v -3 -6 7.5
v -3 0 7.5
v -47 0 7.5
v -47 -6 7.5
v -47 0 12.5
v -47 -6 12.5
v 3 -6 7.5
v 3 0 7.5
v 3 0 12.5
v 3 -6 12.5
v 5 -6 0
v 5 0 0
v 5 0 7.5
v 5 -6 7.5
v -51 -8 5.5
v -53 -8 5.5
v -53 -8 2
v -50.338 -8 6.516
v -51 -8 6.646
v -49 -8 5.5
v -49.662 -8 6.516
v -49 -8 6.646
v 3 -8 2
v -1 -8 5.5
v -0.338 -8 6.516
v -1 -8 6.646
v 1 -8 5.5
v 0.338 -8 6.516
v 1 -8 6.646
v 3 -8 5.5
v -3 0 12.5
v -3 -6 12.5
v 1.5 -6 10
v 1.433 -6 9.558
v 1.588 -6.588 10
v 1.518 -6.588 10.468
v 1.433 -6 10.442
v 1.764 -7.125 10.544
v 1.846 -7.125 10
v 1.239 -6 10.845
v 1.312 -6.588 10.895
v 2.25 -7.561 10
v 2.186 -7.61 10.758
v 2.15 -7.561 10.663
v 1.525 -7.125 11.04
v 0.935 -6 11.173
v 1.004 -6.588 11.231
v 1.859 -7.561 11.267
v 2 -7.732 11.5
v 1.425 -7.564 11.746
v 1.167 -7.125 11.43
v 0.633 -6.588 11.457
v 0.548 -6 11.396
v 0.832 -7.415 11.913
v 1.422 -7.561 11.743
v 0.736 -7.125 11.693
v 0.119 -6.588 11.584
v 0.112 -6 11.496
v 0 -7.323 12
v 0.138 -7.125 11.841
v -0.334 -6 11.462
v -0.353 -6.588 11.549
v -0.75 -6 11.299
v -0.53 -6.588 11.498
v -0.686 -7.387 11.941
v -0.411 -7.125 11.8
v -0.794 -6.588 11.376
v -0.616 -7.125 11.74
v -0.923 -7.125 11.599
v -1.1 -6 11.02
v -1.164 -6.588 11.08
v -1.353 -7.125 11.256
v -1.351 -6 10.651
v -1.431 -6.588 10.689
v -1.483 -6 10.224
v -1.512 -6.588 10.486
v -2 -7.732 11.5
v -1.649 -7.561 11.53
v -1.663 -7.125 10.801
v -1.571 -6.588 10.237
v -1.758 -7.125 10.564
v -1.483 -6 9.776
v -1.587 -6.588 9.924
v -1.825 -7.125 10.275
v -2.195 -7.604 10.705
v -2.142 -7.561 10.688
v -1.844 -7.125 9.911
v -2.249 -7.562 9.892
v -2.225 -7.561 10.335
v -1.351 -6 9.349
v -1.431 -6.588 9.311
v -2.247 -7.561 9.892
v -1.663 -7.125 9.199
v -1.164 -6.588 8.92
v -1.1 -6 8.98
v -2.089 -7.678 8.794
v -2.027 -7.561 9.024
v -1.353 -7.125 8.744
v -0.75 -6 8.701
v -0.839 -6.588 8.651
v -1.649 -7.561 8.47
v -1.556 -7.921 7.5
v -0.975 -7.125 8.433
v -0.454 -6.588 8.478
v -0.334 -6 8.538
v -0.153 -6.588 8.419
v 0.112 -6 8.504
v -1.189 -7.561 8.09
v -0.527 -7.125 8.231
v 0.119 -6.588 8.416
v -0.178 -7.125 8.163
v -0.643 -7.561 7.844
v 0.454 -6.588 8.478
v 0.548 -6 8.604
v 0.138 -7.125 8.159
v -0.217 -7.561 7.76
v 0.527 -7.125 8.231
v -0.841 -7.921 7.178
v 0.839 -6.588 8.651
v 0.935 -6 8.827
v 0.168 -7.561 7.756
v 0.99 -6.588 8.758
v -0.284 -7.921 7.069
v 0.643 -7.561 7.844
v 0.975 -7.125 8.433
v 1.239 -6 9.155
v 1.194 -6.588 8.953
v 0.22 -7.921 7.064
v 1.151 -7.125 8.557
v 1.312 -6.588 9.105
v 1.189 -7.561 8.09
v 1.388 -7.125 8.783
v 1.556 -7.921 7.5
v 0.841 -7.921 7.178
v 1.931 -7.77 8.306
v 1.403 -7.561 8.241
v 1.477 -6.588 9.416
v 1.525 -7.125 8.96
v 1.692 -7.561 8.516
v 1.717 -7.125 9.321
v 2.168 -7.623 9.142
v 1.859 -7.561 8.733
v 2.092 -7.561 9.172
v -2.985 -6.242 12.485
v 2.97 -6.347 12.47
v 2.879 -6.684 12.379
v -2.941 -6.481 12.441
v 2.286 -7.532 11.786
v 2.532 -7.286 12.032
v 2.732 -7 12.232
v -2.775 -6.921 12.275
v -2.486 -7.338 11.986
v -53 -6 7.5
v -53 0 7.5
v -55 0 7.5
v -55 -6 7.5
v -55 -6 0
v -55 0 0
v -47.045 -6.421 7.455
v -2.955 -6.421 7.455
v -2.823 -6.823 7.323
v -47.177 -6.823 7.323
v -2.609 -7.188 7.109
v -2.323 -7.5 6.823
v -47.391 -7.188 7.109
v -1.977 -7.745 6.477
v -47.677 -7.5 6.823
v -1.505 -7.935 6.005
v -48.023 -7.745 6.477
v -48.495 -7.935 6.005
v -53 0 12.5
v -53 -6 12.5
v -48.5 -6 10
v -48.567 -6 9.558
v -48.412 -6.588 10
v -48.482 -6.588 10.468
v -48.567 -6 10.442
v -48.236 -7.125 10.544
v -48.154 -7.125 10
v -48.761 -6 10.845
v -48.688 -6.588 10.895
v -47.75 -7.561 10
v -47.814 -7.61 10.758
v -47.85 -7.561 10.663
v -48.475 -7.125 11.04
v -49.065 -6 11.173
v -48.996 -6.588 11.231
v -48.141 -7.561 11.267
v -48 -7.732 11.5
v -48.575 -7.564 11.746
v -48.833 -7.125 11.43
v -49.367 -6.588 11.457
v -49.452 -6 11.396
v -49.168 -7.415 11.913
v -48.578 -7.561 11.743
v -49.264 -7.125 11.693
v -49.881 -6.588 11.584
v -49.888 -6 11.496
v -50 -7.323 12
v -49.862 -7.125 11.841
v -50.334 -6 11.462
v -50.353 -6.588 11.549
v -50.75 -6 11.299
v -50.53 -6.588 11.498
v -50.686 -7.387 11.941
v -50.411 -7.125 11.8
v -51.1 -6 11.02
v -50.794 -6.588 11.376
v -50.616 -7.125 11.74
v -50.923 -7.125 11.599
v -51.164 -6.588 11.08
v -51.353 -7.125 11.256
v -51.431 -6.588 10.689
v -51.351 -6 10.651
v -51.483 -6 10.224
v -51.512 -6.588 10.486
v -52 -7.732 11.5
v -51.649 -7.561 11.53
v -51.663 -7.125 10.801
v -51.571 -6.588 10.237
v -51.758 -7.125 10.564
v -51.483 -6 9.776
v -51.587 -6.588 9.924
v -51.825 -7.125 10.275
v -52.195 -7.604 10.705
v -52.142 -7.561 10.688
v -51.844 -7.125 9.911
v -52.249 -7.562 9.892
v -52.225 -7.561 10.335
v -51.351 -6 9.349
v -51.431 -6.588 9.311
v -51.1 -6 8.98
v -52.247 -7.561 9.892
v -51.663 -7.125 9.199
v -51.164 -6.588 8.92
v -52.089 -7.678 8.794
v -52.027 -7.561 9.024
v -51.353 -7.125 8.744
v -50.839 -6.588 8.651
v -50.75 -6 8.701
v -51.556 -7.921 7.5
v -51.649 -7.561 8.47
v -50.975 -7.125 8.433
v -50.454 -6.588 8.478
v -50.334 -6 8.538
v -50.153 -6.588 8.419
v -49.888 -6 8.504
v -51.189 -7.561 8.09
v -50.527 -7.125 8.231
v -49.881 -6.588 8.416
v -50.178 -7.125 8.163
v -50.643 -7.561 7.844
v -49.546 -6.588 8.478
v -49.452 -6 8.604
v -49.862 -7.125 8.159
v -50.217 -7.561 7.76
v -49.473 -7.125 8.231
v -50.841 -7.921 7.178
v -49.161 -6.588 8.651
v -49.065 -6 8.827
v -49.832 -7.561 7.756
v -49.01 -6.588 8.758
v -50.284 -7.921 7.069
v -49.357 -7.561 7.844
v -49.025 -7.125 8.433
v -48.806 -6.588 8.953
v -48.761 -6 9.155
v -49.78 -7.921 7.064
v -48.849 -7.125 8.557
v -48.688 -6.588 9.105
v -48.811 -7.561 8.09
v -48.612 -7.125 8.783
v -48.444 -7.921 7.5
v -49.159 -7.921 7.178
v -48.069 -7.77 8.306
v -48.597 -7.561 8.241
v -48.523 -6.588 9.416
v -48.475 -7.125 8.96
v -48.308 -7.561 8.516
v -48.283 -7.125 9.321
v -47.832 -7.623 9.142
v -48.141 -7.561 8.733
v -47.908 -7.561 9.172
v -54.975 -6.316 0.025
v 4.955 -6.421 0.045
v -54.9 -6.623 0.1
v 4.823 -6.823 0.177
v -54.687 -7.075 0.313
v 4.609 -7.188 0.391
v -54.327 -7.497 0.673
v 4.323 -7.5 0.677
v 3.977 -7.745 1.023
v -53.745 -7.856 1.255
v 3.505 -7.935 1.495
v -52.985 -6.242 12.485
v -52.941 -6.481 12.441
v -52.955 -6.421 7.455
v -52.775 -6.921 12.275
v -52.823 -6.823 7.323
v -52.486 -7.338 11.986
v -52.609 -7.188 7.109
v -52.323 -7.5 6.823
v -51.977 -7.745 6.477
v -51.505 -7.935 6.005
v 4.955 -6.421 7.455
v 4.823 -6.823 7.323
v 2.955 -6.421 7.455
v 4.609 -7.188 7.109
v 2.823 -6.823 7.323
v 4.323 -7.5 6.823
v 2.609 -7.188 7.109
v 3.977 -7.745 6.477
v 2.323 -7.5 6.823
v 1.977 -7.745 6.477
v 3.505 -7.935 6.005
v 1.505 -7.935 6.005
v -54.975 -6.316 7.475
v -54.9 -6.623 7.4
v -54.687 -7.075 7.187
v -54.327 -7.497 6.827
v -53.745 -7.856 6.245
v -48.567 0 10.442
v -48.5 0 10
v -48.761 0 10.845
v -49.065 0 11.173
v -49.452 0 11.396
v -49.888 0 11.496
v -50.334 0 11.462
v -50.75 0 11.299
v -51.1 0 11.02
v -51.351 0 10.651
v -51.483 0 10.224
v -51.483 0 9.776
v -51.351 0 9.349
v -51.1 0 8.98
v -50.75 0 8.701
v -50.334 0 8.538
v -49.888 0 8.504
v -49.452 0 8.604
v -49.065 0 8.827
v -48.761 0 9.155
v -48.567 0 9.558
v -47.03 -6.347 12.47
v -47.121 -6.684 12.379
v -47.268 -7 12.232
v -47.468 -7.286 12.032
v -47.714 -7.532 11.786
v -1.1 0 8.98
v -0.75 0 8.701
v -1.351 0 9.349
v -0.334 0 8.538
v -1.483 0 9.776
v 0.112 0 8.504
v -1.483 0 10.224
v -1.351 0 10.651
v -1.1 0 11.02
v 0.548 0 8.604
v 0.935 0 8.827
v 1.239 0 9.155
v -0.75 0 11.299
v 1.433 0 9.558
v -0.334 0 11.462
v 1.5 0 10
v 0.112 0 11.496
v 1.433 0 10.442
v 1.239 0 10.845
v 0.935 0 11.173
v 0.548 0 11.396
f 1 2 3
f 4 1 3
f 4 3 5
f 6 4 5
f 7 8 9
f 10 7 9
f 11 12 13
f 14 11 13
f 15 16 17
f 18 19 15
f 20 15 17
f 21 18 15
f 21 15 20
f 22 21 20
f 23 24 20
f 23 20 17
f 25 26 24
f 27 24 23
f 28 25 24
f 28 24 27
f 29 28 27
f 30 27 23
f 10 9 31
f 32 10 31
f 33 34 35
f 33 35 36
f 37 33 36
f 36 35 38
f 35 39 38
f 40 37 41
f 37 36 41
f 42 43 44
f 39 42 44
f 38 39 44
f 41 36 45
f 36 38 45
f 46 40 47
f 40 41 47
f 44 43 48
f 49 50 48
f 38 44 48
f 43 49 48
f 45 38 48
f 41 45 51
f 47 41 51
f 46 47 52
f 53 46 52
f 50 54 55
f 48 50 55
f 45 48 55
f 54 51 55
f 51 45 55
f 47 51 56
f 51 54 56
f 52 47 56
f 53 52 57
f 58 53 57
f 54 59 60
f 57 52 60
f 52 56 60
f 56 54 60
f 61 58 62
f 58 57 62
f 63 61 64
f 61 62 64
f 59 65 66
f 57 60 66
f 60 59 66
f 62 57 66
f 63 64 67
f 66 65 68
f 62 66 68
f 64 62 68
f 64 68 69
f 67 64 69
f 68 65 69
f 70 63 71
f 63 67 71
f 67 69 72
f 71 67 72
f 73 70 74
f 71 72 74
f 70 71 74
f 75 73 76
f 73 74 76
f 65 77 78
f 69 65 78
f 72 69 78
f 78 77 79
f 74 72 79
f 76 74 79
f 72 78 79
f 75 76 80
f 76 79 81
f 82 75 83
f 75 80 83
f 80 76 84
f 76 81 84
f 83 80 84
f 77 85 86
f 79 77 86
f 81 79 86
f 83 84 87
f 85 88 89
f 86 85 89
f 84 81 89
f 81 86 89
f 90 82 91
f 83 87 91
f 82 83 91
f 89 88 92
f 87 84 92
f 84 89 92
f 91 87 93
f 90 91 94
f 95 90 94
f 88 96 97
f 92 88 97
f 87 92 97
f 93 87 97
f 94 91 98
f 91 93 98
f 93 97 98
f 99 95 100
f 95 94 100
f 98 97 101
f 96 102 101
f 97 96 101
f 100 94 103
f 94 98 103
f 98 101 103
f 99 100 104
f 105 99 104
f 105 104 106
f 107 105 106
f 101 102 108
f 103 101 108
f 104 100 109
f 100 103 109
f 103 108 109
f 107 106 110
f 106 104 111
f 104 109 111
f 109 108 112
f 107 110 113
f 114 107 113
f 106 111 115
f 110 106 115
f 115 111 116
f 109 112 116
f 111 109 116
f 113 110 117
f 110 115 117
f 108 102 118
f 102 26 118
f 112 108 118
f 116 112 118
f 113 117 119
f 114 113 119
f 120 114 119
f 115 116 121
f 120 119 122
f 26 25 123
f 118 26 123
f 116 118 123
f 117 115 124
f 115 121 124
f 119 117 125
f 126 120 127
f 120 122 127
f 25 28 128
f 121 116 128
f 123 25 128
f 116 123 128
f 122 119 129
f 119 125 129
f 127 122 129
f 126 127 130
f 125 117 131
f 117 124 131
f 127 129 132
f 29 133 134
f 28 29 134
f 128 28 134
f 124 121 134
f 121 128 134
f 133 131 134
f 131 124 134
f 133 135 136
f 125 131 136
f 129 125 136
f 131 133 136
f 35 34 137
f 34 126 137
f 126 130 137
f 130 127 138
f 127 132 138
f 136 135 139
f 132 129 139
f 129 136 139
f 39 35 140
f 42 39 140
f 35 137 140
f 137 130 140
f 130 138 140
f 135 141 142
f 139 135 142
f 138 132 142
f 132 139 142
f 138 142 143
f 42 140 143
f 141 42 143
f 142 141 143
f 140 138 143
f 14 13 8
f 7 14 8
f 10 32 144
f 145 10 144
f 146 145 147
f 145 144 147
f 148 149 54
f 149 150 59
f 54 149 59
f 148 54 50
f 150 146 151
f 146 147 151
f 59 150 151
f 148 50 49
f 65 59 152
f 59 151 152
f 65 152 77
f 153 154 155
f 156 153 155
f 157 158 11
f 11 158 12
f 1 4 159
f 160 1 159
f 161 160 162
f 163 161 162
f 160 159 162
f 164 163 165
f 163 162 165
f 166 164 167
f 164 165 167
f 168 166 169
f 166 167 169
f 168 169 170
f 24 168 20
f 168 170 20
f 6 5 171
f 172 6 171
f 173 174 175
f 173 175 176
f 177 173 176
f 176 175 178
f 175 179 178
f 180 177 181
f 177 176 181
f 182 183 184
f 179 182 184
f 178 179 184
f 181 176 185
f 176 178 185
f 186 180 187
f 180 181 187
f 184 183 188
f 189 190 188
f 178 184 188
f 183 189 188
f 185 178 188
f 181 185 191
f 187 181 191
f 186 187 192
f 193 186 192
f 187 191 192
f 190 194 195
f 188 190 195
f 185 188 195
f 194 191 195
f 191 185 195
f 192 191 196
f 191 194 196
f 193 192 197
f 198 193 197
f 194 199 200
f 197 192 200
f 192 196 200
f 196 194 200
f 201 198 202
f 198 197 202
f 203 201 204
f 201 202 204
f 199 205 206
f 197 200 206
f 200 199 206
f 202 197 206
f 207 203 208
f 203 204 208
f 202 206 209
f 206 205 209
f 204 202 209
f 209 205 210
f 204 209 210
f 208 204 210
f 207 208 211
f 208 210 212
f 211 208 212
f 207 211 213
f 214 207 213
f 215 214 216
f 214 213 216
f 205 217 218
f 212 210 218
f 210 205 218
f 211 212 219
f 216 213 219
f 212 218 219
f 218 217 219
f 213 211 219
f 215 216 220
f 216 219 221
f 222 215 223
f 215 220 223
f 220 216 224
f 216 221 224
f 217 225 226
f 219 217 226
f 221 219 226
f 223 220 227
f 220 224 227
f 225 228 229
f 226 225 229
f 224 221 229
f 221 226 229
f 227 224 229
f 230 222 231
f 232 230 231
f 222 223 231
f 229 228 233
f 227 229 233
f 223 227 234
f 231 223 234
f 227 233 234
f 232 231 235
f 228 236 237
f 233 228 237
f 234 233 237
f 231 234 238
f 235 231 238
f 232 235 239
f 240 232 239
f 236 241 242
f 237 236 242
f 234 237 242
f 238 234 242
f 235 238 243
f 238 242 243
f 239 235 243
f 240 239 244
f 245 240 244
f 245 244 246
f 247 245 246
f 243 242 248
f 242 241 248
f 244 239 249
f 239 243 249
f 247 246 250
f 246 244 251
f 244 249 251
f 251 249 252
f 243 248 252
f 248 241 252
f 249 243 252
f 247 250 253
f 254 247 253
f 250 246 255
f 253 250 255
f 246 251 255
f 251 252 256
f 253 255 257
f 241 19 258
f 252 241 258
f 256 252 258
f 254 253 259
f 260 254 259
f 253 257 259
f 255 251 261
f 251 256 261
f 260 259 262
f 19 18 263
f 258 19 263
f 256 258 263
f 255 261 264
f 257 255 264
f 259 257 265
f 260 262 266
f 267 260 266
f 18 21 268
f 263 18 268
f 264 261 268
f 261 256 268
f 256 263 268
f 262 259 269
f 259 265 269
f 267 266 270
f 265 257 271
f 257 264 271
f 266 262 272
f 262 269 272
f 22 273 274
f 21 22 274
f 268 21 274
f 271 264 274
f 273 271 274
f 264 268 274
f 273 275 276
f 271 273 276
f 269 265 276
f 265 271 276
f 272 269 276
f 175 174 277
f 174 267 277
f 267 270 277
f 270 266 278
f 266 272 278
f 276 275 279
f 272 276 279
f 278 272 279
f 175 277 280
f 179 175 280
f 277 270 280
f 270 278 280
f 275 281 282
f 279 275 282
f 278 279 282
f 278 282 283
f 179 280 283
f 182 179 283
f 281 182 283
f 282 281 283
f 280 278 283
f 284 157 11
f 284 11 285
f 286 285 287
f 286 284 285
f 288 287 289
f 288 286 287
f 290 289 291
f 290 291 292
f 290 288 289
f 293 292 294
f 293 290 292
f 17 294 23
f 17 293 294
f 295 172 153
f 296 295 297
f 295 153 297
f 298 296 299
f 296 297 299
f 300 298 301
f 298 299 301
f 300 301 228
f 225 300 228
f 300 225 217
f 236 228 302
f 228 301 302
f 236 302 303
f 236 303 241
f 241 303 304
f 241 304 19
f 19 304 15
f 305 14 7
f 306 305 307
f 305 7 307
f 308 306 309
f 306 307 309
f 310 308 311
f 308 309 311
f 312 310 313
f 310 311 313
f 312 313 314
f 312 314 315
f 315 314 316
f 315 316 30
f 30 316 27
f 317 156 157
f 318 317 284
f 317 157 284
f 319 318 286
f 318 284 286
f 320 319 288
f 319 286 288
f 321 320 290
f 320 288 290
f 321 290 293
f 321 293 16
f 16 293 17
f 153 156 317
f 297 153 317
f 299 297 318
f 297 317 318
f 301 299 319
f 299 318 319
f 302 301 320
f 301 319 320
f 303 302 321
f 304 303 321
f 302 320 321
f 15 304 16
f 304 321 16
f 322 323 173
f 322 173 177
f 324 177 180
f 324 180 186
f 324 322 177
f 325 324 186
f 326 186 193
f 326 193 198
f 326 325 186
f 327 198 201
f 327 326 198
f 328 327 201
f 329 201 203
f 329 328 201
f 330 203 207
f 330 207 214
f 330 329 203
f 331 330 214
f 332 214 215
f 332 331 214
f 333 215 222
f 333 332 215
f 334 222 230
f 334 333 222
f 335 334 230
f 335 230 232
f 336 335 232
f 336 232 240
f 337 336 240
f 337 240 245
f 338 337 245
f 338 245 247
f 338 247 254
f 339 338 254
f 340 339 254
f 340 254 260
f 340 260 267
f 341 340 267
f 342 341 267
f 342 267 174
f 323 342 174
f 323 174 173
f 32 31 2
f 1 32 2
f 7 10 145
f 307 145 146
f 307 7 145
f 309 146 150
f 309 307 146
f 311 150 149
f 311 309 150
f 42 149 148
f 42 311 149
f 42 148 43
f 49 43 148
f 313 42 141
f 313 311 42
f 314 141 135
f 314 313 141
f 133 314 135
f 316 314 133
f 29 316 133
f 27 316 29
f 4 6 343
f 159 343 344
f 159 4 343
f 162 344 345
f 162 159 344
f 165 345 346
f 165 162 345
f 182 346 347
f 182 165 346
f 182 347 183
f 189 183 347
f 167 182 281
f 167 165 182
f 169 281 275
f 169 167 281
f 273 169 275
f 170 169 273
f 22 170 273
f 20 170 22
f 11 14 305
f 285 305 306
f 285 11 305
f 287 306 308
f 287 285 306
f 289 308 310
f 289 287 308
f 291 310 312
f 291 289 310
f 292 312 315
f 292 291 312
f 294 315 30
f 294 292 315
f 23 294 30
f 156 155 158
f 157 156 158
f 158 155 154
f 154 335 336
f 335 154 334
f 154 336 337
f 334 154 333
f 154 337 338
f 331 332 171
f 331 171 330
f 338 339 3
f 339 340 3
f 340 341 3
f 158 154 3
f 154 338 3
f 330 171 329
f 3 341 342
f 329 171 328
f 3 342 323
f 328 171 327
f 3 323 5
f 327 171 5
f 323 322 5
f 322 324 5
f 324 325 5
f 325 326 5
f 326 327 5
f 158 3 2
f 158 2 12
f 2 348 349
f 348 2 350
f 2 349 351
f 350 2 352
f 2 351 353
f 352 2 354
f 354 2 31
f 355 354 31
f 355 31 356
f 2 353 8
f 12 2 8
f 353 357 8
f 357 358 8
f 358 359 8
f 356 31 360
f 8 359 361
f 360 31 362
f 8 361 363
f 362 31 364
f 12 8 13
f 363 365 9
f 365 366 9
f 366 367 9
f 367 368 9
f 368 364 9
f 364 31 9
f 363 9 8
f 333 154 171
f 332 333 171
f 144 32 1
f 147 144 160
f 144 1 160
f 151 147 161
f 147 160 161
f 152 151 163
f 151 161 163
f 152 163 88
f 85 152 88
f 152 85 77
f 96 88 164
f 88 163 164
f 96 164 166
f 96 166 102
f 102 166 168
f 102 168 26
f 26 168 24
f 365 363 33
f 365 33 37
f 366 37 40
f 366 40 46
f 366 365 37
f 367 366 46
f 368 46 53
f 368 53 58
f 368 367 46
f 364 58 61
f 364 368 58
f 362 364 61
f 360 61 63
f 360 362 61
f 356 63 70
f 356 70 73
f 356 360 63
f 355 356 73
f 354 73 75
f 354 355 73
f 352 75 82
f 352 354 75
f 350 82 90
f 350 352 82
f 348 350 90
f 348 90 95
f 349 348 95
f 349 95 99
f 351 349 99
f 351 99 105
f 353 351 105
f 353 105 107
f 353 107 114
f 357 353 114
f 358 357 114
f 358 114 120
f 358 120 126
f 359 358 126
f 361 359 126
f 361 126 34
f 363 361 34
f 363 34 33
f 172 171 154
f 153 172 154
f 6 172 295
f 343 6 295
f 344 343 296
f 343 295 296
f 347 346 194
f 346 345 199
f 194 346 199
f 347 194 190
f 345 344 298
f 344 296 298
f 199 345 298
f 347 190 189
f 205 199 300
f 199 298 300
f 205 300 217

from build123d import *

# Parameters (mm, degrees)
F0_R         = 1.5
F1_DEPTH     = 8
F2_T1_DEPTH  = 17.5
F2_T3_DEPTH  = 70
F2_T5_DEPTH  = 7
F2_T7_DEPTH  = 10
F2_T9_DEPTH  = 16
F2_T11_DEPTH = 44
F2_T13_DEPTH = 16
F2_T15_DEPTH = 7
F2_T25_DEPTH = 12
F2_T29_DEPTH = 15
F2_T36_DEPTH = 15
F2_T40_DEPTH = 49
F2_T47_DEPTH = 49
F2_T51_DEPTH = 15
F2_T58_DEPTH = 15
F2_T62_DEPTH = 12


# Not quite as in the source:
# - a fillet or chamfer that OpenCascade refuses, or shapes differently, is made with other operations: its cross-section is extruded or revolved along the edge and cut away or added


with BuildPart() as f1:
    # F0 (on Front) → F1 (new body)
    with BuildSketch(Plane.XZ):
        Polygon((-55, 7.5), (-55, 0), (5, 0), (5, 7.5), (3, 7.5), (3, 12.5), (-3, 12.5), (-3, 7.5), (-47, 7.5), (-47, 12.5), (-53, 12.5), (-53, 7.5), align=None)
        with Locations((-50, 10)):
            Circle(F0_R, mode=Mode.SUBTRACT)
        with Locations((0, 10)):
            Circle(F0_R, mode=Mode.SUBTRACT)
    extrude(amount=F1_DEPTH)

    # F2: fillet of radius 2 on 14 edges, made by hand

    # F2_s2 → F2_t1 (cut)
    with BuildSketch(Plane.XY.offset(-5)):
        with BuildLine():
            ThreePointArc((-55, -6), (-54.4142135624, -7.4142135624), (-53, -8))
            Line((-53, -8), (-55, -8))
            Line((-55, -8), (-55, -6))
        make_face()
        with BuildLine():
            ThreePointArc((5, -6), (4.4142135624, -7.4142135624), (3, -8))
            Line((3, -8), (5, -8))
            Line((5, -8), (5, -6))
        make_face()
    extrude(amount=F2_T1_DEPTH, mode=Mode.SUBTRACT)

    # F2_s4 → F2_t3 (cut)
    with BuildSketch(Plane.YZ.offset(-60)):
        with BuildLine():
            ThreePointArc((-6, 0), (-7.4142135624, 0.5857864376), (-8, 2))
            Line((-8, 2), (-8, 0))
            Line((-8, 0), (-6, 0))
        make_face()
    extrude(amount=F2_T3_DEPTH, mode=Mode.SUBTRACT)

    # F2_s6 → F2_t5 (cut)
    with BuildSketch(Plane.YZ.offset(3)):
        with BuildLine():
            ThreePointArc((-6, 7.5), (-7.4142135624, 6.9142135624), (-8, 5.5))
            Line((-8, 5.5), (-8, 7.5))
            Line((-8, 7.5), (-6, 7.5))
        make_face()
    extrude(amount=F2_T5_DEPTH, mode=Mode.SUBTRACT)

    # F2_s8 → F2_t7 (cut)
    with BuildSketch(Plane.XY.offset(7.5)):
        with BuildLine():
            ThreePointArc((3, -6), (2.4142135624, -7.4142135624), (1, -8))
            Line((1, -8), (3, -8))
            Line((3, -8), (3, -6))
        make_face()
        with BuildLine():
            ThreePointArc((-3, -6), (-2.4142135624, -7.4142135624), (-1, -8))
            Line((-1, -8), (-3, -8))
            Line((-3, -8), (-3, -6))
        make_face()
        with BuildLine():
            ThreePointArc((-47, -6), (-47.5857864376, -7.4142135624), (-49, -8))
            Line((-49, -8), (-47, -8))
            Line((-47, -8), (-47, -6))
        make_face()
        with BuildLine():
            ThreePointArc((-53, -6), (-52.4142135624, -7.4142135624), (-51, -8))
            Line((-51, -8), (-53, -8))
            Line((-53, -8), (-53, -6))
        make_face()
    extrude(amount=F2_T7_DEPTH, mode=Mode.SUBTRACT)

    # F2_s10 → F2_t9 (cut)
    with BuildSketch(Plane.YZ.offset(-8)):
        with BuildLine():
            ThreePointArc((-6, 12.5), (-7.4142135624, 11.9142135624), (-8, 10.5))
            Line((-8, 10.5), (-8, 12.5))
            Line((-8, 12.5), (-6, 12.5))
        make_face()
    extrude(amount=F2_T9_DEPTH, mode=Mode.SUBTRACT)

    # F2_s12 → F2_t11 (cut)
    with BuildSketch(Plane.YZ.offset(-47)):
        with BuildLine():
            ThreePointArc((-6, 7.5), (-7.4142135624, 6.9142135624), (-8, 5.5))
            Line((-8, 5.5), (-8, 7.5))
            Line((-8, 7.5), (-6, 7.5))
        make_face()
    extrude(amount=F2_T11_DEPTH, mode=Mode.SUBTRACT)

    # F2_s14 → F2_t13 (cut)
    with BuildSketch(Plane.YZ.offset(-58)):
        with BuildLine():
            ThreePointArc((-6, 12.5), (-7.4142135624, 11.9142135624), (-8, 10.5))
            Line((-8, 10.5), (-8, 12.5))
            Line((-8, 12.5), (-6, 12.5))
        make_face()
    extrude(amount=F2_T13_DEPTH, mode=Mode.SUBTRACT)

    # F2_s16 → F2_t15 (cut)
    with BuildSketch(Plane.YZ.offset(-60)):
        with BuildLine():
            ThreePointArc((-6, 7.5), (-7.4142135624, 6.9142135624), (-8, 5.5))
            Line((-8, 5.5), (-8, 7.5))
            Line((-8, 7.5), (-6, 7.5))
        make_face()
    extrude(amount=F2_T15_DEPTH, mode=Mode.SUBTRACT)

    # F2_s17 → F2_t18 (revolve, cut)
    with BuildSketch(Plane.XY.offset(10)):
        with BuildLine():
            ThreePointArc((-48.5, -6), (-47.9142135624, -7.4142135624), (-46.5, -8))
            Line((-46.5, -8), (-48.5, -8))
            Line((-48.5, -8), (-48.5, -6))
        make_face()
    revolve(axis=Axis((-50, -8, 10), (0, -1, 0)), mode=Mode.SUBTRACT)

    # F2_s19 → F2_t20 (revolve, cut)
    with BuildSketch(Plane.XY.offset(10)):
        with BuildLine():
            ThreePointArc((1.5, -6), (2.0857864376, -7.4142135624), (3.5, -8))
            Line((3.5, -8), (1.5, -8))
            Line((1.5, -8), (1.5, -6))
        make_face()
    revolve(axis=Axis((0, -8, 10), (0, -1, 0)), mode=Mode.SUBTRACT)


with BuildPart() as f2_tool23:
    # F2_s24 → F2_t25 (new body)
    with BuildSketch(Plane.YZ.offset(10)):
        with BuildLine():
            ThreePointArc((-6, 7.5), (-7.4142135624, 6.9142135624), (-8, 5.5))
            Line((-8, 5.5), (-8, 7.5))
            Line((-8, 7.5), (-6, 7.5))
        make_face()
    extrude(amount=-F2_T25_DEPTH)

    split(bisect_by=Plane.YZ.offset(3), keep=Keep.BOTTOM)


with BuildPart() as f2_tool27:
    # F2_s28 → F2_t29 (new body)
    with BuildSketch(Plane.XY.offset(2.5)):
        with BuildLine():
            ThreePointArc((3, -6), (2.4142135624, -7.4142135624), (1, -8))
            Line((1, -8), (3, -8))
            Line((3, -8), (3, -6))
        make_face()
    extrude(amount=F2_T29_DEPTH)

    split(bisect_by=Plane.XY.offset(7.5), keep=Keep.BOTTOM)


with BuildPart() as f2_tool23_1:
    add(f2_tool23.part)

    # F2_t31: intersect F2_tool27
    add(f2_tool27.part, mode=Mode.INTERSECT)


with BuildPart() as f1_1:
    add(f1.part)

    # F2_t21: cut F2_tool23
    add(f2_tool23_1.part, mode=Mode.SUBTRACT)


with BuildPart() as f2_tool34:
    # F2_s35 → F2_t36 (new body)
    with BuildSketch(Plane.XY.offset(17.5)):
        with BuildLine():
            ThreePointArc((-3, -6), (-2.4142135624, -7.4142135624), (-1, -8))
            Line((-1, -8), (-3, -8))
            Line((-3, -8), (-3, -6))
        make_face()
    extrude(amount=-F2_T36_DEPTH)

    split(bisect_by=Plane.XY.offset(7.5), keep=Keep.BOTTOM)


with BuildPart() as f2_tool38:
    # F2_s39 → F2_t40 (new body)
    with BuildSketch(Plane.YZ.offset(2)):
        with BuildLine():
            ThreePointArc((-6, 7.5), (-7.4142135624, 6.9142135624), (-8, 5.5))
            Line((-8, 5.5), (-8, 7.5))
            Line((-8, 7.5), (-6, 7.5))
        make_face()
    extrude(amount=-F2_T40_DEPTH)

    split(bisect_by=Plane.YZ.offset(-3), keep=Keep.TOP)


with BuildPart() as f2_tool34_1:
    add(f2_tool34.part)

    # F2_t42: intersect F2_tool38
    add(f2_tool38.part, mode=Mode.INTERSECT)


with BuildPart() as f1_2:
    add(f1_1.part)

    # F2_t32: cut F2_tool34
    add(f2_tool34_1.part, mode=Mode.SUBTRACT)


with BuildPart() as f2_tool45:
    # F2_s46 → F2_t47 (new body)
    with BuildSketch(Plane.YZ.offset(-3)):
        with BuildLine():
            ThreePointArc((-6, 7.5), (-7.4142135624, 6.9142135624), (-8, 5.5))
            Line((-8, 5.5), (-8, 7.5))
            Line((-8, 7.5), (-6, 7.5))
        make_face()
    extrude(amount=-F2_T47_DEPTH)

    split(bisect_by=Plane.YZ.offset(-47), keep=Keep.BOTTOM)


with BuildPart() as f2_tool49:
    # F2_s50 → F2_t51 (new body)
    with BuildSketch(Plane.XY.offset(2.5)):
        with BuildLine():
            ThreePointArc((-47, -6), (-47.5857864376, -7.4142135624), (-49, -8))
            Line((-49, -8), (-47, -8))
            Line((-47, -8), (-47, -6))
        make_face()
    extrude(amount=F2_T51_DEPTH)

    split(bisect_by=Plane.XY.offset(7.5), keep=Keep.BOTTOM)


with BuildPart() as f2_tool45_1:
    add(f2_tool45.part)

    # F2_t53: intersect F2_tool49
    add(f2_tool49.part, mode=Mode.INTERSECT)


with BuildPart() as f1_3:
    add(f1_2.part)

    # F2_t43: cut F2_tool45
    add(f2_tool45_1.part, mode=Mode.SUBTRACT)


with BuildPart() as f2_tool56:
    # F2_s57 → F2_t58 (new body)
    with BuildSketch(Plane.XY.offset(17.5)):
        with BuildLine():
            ThreePointArc((-53, -6), (-52.4142135624, -7.4142135624), (-51, -8))
            Line((-51, -8), (-53, -8))
            Line((-53, -8), (-53, -6))
        make_face()
    extrude(amount=-F2_T58_DEPTH)

    split(bisect_by=Plane.XY.offset(7.5), keep=Keep.BOTTOM)


with BuildPart() as f2_tool60:
    # F2_s61 → F2_t62 (new body)
    with BuildSketch(Plane.YZ.offset(-48)):
        with BuildLine():
            ThreePointArc((-6, 7.5), (-7.4142135624, 6.9142135624), (-8, 5.5))
            Line((-8, 5.5), (-8, 7.5))
            Line((-8, 7.5), (-6, 7.5))
        make_face()
    extrude(amount=-F2_T62_DEPTH)

    split(bisect_by=Plane.YZ.offset(-53), keep=Keep.TOP)


with BuildPart() as f2_tool56_1:
    add(f2_tool56.part)

    # F2_t64: intersect F2_tool60
    add(f2_tool60.part, mode=Mode.INTERSECT)


with BuildPart() as f1_4:
    add(f1_3.part)

    # F2_t54: cut F2_tool56
    add(f2_tool56_1.part, mode=Mode.SUBTRACT)


solid = f1_4.part
